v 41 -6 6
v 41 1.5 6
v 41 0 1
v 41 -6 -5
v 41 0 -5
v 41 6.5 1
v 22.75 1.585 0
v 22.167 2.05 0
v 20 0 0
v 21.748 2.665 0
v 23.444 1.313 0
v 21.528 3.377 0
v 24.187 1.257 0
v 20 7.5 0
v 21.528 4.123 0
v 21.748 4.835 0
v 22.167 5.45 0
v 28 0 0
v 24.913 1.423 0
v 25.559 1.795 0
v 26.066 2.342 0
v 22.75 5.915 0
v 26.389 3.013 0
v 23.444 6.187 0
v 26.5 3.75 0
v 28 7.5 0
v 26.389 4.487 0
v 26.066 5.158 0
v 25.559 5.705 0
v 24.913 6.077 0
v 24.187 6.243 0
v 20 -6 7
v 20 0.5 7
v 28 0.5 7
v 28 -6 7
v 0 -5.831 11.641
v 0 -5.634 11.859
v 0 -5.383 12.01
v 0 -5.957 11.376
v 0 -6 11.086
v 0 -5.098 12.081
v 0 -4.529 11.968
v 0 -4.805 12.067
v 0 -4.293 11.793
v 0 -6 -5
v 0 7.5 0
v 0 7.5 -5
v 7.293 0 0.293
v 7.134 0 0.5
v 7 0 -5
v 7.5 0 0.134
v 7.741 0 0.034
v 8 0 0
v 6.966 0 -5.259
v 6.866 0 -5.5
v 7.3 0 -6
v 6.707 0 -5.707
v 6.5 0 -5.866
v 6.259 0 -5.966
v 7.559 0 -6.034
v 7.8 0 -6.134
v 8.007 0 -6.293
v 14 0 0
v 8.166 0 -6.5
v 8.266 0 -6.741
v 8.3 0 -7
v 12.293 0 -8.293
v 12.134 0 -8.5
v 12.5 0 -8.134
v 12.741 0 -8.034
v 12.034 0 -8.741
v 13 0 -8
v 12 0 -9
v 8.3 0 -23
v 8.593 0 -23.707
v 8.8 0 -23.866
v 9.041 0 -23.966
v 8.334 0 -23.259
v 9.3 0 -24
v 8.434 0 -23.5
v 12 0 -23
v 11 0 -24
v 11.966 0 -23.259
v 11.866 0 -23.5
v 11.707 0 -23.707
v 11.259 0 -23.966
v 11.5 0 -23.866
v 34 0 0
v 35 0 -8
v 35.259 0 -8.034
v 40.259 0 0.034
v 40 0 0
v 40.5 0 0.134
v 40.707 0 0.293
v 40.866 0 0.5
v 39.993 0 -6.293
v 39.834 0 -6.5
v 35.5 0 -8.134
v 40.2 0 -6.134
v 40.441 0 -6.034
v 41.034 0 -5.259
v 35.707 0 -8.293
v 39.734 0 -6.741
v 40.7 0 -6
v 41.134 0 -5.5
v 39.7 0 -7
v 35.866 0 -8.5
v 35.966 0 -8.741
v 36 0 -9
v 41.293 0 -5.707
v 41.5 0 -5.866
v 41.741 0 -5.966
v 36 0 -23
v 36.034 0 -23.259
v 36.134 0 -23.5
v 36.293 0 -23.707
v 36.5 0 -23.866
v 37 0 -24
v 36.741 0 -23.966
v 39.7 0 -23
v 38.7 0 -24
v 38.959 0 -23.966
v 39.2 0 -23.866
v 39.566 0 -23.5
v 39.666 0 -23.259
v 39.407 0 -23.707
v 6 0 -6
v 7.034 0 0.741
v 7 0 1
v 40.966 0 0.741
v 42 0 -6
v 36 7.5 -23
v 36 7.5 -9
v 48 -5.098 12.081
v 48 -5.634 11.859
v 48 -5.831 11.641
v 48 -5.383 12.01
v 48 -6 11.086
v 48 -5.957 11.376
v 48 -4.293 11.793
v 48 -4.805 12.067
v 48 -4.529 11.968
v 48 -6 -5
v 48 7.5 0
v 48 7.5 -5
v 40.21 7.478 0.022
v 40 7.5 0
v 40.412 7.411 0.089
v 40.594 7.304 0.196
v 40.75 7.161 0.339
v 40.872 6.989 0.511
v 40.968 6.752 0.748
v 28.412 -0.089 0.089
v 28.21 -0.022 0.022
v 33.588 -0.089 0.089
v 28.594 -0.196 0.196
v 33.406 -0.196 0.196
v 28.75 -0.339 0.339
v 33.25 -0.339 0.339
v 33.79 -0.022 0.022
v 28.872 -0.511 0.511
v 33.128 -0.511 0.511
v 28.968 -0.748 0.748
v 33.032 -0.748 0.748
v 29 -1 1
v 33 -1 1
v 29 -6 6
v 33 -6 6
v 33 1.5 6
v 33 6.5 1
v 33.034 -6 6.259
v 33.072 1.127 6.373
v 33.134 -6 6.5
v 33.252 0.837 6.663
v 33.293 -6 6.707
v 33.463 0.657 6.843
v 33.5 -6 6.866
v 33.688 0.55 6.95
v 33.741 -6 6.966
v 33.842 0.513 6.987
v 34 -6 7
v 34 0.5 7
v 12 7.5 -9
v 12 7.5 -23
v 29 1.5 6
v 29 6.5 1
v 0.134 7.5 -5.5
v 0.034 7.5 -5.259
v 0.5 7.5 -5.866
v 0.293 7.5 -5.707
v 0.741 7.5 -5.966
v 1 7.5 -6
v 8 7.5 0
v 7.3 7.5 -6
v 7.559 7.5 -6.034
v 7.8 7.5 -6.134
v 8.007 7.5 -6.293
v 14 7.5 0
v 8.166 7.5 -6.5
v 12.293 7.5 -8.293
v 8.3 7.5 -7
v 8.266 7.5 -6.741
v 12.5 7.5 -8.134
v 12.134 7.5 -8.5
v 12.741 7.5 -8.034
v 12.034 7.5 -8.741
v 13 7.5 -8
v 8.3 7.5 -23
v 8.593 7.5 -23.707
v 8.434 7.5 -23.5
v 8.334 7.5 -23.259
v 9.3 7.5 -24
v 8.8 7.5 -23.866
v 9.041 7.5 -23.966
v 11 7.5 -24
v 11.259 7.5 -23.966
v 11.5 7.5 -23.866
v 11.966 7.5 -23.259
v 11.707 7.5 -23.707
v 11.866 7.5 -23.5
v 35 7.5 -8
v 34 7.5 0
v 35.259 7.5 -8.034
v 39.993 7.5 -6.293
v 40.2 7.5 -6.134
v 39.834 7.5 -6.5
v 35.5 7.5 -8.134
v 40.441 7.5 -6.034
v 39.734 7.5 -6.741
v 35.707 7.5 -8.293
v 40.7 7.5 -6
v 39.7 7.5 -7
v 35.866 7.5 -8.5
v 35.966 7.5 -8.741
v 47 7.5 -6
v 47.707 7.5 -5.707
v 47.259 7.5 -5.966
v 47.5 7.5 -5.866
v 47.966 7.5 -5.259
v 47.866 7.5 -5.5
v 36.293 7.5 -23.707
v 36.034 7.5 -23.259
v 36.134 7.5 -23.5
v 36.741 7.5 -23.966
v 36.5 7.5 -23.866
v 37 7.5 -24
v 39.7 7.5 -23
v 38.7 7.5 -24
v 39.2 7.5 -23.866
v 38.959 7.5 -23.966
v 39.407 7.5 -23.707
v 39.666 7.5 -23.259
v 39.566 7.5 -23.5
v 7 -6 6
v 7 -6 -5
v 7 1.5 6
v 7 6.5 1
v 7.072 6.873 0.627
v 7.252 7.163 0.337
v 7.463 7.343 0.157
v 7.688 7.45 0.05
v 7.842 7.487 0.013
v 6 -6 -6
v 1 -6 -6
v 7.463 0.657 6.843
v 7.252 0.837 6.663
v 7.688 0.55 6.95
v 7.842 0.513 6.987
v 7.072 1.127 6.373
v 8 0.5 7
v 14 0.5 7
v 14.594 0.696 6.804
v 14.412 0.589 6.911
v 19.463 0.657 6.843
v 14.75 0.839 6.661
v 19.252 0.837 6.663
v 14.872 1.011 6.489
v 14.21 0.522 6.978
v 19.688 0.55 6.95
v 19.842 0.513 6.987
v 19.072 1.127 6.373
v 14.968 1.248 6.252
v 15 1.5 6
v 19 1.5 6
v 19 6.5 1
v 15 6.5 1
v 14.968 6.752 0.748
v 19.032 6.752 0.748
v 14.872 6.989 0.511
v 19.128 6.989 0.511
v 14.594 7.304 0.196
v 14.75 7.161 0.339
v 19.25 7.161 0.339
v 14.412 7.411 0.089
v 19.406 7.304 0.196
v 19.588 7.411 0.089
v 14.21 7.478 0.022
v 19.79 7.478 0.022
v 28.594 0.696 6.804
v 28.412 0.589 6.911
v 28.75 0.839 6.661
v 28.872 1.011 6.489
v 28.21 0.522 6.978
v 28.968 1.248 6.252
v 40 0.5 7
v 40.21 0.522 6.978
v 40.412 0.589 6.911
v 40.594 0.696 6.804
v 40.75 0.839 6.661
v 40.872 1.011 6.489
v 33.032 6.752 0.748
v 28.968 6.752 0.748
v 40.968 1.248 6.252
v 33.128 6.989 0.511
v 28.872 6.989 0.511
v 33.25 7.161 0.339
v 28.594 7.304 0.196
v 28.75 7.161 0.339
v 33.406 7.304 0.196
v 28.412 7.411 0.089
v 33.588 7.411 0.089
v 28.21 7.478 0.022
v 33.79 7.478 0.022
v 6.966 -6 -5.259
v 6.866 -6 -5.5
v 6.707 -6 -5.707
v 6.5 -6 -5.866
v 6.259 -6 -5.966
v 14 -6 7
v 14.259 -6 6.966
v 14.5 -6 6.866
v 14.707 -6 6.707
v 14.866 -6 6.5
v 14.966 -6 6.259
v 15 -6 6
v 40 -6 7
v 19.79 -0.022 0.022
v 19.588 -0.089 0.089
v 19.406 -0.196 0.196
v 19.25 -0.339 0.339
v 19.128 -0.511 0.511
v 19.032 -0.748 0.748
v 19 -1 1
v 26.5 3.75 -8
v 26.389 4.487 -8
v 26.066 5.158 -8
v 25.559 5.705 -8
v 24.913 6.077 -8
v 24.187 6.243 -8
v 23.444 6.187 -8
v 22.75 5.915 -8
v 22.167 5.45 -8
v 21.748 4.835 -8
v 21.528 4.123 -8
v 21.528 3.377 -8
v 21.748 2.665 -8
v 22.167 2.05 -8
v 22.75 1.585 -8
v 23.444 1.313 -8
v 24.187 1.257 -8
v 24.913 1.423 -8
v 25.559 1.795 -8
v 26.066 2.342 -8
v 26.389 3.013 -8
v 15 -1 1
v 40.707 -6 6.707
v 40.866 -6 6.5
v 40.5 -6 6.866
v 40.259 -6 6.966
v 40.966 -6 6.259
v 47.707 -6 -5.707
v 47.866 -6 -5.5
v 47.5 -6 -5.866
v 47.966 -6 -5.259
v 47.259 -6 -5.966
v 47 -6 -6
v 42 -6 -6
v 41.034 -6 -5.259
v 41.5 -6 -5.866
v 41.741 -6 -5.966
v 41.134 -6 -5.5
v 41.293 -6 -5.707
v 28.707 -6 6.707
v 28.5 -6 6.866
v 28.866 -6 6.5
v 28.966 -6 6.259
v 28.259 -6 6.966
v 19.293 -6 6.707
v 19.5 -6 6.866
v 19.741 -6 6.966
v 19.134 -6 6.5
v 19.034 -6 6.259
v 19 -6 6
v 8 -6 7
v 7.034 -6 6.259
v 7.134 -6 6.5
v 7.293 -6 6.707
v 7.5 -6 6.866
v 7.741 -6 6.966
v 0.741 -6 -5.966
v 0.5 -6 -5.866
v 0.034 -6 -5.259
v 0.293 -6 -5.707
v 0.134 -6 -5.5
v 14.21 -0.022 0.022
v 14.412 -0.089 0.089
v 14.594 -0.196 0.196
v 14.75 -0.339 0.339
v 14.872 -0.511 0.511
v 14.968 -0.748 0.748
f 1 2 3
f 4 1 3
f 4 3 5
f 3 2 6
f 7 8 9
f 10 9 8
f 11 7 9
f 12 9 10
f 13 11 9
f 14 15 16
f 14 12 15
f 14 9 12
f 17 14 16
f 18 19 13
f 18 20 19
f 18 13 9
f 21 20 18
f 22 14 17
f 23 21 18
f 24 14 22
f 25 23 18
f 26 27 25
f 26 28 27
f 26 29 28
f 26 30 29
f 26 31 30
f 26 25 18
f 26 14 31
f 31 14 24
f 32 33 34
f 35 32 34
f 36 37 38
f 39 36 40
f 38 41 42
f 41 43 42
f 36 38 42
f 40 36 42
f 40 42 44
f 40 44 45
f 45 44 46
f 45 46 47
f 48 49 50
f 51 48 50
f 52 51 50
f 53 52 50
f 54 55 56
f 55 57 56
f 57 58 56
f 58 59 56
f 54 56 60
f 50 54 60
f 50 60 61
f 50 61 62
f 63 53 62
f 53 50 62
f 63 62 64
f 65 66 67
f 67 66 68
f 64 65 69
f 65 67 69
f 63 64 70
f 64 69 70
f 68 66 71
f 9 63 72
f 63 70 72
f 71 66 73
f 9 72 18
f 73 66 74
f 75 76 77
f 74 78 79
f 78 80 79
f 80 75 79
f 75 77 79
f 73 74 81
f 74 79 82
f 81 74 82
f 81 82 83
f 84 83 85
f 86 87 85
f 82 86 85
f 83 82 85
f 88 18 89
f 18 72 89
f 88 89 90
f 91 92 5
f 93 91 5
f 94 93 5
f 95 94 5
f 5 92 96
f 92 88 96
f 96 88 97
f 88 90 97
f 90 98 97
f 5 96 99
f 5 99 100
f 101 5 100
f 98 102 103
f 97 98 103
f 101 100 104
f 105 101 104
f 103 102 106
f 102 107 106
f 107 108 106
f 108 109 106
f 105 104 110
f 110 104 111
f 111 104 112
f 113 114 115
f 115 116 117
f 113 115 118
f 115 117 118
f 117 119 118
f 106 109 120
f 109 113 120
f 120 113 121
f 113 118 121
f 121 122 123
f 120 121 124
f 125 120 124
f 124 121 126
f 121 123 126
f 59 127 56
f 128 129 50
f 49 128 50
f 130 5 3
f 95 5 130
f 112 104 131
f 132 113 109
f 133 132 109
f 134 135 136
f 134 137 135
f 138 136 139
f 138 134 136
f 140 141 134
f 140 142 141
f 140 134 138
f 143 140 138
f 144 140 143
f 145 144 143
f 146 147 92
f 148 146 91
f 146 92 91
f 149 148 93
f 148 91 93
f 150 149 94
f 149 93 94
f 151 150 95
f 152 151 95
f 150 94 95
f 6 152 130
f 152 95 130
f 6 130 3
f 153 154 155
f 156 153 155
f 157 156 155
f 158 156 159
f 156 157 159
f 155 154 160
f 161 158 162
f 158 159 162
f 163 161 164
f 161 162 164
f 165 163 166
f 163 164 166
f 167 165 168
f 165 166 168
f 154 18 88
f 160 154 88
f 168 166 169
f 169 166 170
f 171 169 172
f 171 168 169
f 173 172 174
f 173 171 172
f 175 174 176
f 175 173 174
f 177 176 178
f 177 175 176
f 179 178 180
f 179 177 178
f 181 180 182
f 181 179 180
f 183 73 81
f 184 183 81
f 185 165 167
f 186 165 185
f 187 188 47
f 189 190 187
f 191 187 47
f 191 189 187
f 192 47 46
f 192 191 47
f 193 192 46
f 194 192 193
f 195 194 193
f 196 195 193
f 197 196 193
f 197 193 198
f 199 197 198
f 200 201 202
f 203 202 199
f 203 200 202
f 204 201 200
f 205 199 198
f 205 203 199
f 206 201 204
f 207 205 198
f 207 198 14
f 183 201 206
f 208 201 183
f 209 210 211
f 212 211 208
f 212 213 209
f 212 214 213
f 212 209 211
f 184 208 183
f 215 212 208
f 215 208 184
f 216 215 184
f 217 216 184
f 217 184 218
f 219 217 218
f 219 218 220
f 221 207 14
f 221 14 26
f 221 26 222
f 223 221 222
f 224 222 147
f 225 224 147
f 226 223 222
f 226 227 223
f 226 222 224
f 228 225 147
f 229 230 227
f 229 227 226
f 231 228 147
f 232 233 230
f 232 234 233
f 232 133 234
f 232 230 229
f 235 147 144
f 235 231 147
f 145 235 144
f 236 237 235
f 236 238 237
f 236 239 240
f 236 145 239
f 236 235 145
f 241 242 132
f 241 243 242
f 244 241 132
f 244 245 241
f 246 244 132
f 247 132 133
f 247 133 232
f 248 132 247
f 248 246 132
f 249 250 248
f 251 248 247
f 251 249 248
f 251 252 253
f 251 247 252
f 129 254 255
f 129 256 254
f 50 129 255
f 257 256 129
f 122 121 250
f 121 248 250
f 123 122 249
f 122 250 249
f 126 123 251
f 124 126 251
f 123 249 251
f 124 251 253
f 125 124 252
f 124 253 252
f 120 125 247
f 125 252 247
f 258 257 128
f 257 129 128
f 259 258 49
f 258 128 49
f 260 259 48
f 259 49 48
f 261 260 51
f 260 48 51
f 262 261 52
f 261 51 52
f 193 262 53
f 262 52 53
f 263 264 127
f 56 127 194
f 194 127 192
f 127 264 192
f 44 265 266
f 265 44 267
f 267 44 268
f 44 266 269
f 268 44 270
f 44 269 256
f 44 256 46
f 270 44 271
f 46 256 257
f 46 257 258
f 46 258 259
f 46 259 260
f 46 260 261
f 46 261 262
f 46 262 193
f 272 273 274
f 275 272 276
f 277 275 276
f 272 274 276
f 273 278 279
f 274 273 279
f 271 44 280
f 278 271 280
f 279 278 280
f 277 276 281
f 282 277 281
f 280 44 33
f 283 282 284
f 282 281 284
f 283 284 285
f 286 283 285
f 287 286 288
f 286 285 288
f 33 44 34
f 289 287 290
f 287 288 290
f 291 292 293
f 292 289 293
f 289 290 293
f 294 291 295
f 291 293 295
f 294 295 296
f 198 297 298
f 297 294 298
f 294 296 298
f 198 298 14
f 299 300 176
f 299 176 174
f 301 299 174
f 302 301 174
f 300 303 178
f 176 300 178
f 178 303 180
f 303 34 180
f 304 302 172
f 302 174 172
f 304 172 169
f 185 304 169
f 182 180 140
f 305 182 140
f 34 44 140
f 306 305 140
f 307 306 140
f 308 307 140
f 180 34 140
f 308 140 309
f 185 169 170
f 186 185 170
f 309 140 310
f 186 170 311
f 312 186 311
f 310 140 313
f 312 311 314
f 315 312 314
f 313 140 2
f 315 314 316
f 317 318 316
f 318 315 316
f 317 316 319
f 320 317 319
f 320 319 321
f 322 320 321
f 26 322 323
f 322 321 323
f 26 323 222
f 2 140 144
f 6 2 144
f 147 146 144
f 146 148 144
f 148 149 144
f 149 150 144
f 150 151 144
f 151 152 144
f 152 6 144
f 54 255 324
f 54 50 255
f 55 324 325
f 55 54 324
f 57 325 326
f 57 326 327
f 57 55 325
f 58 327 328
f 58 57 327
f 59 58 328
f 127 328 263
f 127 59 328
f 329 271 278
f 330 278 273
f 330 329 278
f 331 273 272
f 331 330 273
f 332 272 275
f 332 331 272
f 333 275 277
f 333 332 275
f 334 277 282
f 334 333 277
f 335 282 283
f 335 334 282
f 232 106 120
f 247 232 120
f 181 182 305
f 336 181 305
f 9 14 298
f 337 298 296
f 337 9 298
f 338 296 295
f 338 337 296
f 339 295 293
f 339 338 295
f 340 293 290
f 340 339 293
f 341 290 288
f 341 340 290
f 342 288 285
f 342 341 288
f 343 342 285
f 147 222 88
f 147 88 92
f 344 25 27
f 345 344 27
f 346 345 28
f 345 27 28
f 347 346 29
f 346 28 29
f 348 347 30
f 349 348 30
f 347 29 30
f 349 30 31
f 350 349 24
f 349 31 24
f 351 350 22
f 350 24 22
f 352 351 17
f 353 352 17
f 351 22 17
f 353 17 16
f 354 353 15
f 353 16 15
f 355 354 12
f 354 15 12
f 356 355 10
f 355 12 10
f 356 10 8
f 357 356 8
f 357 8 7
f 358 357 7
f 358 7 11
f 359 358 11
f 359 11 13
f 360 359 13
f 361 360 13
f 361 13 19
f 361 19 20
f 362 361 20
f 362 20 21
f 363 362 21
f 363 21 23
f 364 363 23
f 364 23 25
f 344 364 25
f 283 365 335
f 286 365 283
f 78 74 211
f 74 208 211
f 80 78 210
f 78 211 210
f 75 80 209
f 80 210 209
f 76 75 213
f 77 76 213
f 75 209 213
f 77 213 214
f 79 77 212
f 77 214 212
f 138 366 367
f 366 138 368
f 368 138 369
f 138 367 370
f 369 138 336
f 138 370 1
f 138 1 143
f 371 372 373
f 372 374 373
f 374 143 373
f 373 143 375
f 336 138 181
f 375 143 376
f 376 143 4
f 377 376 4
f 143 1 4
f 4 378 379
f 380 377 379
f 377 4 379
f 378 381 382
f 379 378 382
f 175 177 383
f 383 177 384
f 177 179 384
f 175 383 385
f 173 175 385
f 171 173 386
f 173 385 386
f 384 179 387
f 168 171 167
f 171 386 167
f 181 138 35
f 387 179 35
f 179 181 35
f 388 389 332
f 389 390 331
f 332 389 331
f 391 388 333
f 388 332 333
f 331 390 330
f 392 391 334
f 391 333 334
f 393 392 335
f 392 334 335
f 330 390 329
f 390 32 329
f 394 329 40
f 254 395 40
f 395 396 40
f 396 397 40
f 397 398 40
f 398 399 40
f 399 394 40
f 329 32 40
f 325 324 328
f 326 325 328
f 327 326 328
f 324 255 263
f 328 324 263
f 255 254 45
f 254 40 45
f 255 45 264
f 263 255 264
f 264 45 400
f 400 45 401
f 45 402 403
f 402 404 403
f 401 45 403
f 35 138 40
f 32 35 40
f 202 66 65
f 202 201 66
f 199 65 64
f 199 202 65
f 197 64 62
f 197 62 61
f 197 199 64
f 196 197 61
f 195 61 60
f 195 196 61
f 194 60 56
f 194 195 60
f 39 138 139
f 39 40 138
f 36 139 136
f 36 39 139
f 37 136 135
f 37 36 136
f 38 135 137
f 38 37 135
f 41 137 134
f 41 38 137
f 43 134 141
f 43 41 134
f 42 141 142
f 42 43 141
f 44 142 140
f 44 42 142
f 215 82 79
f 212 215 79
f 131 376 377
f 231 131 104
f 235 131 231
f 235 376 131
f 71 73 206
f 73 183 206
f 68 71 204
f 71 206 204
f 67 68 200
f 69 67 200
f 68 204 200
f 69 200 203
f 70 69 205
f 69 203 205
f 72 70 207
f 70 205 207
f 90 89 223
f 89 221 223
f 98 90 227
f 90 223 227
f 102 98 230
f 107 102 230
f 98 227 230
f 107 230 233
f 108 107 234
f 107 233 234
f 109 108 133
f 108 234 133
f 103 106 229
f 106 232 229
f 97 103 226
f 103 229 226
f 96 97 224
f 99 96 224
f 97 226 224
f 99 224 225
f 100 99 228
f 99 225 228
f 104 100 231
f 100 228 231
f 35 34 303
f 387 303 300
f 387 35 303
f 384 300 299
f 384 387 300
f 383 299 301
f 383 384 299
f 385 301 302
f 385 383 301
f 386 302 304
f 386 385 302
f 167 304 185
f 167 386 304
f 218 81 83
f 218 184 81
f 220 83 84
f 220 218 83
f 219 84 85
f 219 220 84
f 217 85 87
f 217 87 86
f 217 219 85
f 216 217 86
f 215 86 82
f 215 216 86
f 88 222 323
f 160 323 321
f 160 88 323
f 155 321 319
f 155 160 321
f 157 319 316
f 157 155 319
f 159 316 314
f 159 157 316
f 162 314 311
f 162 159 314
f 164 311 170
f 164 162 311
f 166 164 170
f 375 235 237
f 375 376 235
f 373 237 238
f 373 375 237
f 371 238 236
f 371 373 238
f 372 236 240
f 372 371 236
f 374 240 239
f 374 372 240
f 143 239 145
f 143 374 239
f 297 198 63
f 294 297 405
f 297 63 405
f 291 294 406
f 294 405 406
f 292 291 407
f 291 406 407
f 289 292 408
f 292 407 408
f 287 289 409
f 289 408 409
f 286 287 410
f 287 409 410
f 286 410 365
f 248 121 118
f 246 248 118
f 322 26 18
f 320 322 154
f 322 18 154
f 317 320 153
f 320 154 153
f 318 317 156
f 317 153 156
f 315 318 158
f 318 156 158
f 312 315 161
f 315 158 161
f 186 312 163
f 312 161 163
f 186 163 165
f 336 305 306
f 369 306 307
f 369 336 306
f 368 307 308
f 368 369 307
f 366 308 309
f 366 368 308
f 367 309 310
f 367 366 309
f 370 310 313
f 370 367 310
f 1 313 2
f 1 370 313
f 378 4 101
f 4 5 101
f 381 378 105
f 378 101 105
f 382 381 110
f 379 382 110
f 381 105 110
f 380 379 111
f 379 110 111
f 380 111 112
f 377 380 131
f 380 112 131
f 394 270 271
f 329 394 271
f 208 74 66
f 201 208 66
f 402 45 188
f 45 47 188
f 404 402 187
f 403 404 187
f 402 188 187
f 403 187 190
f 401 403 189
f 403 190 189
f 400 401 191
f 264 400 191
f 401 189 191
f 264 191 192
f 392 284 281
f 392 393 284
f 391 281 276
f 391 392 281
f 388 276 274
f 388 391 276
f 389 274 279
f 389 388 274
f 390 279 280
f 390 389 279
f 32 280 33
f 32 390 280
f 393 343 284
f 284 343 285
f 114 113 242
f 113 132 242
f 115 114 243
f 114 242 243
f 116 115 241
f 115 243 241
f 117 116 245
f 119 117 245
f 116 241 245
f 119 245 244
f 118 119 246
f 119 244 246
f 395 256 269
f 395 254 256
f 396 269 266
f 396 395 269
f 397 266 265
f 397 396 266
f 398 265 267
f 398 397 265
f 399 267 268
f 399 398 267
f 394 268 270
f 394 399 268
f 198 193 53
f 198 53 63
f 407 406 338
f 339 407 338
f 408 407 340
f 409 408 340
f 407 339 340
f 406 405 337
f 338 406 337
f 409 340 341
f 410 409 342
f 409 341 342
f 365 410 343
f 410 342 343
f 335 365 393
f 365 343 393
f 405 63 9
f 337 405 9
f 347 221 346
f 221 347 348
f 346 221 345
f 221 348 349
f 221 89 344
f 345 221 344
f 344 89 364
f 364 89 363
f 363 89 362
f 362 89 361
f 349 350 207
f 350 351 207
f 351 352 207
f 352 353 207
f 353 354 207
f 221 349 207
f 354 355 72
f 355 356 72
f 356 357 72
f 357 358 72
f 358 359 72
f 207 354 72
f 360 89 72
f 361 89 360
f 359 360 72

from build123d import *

# Parameters (mm, degrees)
BOSS_EXTRUDE2_DEPTH   = 7.5
BOSS_EXTRUDE3_DEPTH   = 48
BOSS_EXTRUDE4_DEPTH   = 7
CUT_EXTRUDE2_START    = -13.5
SKETCH4_W             = 8
SKETCH4_H             = 7
SKETCH4_W_2           = 10
CUT_EXTRUDE2_DEPTH    = 13.5
M6X1_0_TAPPED_HOLE4_D = 5
FILLET1_R             = 1


with BuildPart() as part:
    # Sketch1 → Boss-Extrude2 (new body)
    with BuildSketch(Plane(origin=(0, 0, 0), x_dir=(1, 0, 0), z_dir=(0, 1, 0))):
        Polygon((12, 24), (8.3, 24), (8.3, 6), (0, 6), (0, 0), (48, 0), (48, 6), (39.7, 6), (39.7, 24), (36, 24), (36, 8), (12, 8), align=None)
    extrude(amount=BOSS_EXTRUDE2_DEPTH)

    # Sketch3 → Boss-Extrude3 (add)
    with BuildSketch(Plane(origin=(48, 0, 0), x_dir=(0, 0, -1), z_dir=(1, 0, 0))):
        Polygon((0, 0), (-6, -6), (-13.5, -6), (0, 7.5), align=None)
    extrude(amount=-BOSS_EXTRUDE3_DEPTH)

    # Sketch16 → Boss-Extrude4 (add)
    with BuildSketch(Plane(origin=(48, 0, 0), x_dir=(0, 0, -1), z_dir=(1, 0, 0))):
        Polygon((-6, -6), (6, -6), (6, 0), (0, 0), align=None)
    boss_extrude4 = extrude(amount=-BOSS_EXTRUDE4_DEPTH)

    # Sketch4 → Cut-Extrude2 (cut)
    with BuildSketch(Plane.XZ.offset(6).offset(CUT_EXTRUDE2_START)):
        with Locations((11, 3.5)):
            Rectangle(SKETCH4_W, SKETCH4_H)
        with Locations((37, 3.5)):
            Rectangle(SKETCH4_W, SKETCH4_H)
        with Locations((24, 3.5)):
            Rectangle(SKETCH4_W_2, SKETCH4_H)
    extrude(amount=CUT_EXTRUDE2_DEPTH, mode=Mode.SUBTRACT)

    # M6x1.0 Tapped Hole4 (through all)
    with Locations(Plane(origin=(0, 0, -8), x_dir=(-1, 0, 0), z_dir=(0, 0, -1))):
        with Locations((-24, 3.75)):
            Hole(M6X1_0_TAPPED_HOLE4_D / 2)

    # Mirror1: Boss-Extrude4 across plane
    add(boss_extrude4.mirror(Plane.ZY.offset(-24)))

    # Fillet1
    fillet1_edges = [part.edges().sort_by_distance(p)[0] for p in [
        (29, 3.75, 0),
        (29, -2.75, 7),
        (19, -2.75, 7),
        (19, 3.75, 0),
        (7, -3, -6),
        (39.7, 3.75, -24),
        (39.7, 3.75, -6),
        (48, 0.75, -6),
        (0, 0.75, -6),
        (8.3, 3.75, -6),
        (8.3, 3.75, -24),
        (12, 3.75, -24),
        (12, 3.75, -8),
        (36, 3.75, -8),
        (36, 3.75, -24),
        (24, -6, 13.5),
        (41, -3, -6),
        (15, 3.75, 0),
        (15, -2.75, 7),
        (7, -2.75, 7),
        (7, 3.75, 0),
        (33, -2.75, 7),
        (33, 3.75, 0),
        (41, 3.75, 0),
        (41, -2.75, 7),
    ]]
    fillet(fillet1_edges, radius=FILLET1_R)


solid = part.part
